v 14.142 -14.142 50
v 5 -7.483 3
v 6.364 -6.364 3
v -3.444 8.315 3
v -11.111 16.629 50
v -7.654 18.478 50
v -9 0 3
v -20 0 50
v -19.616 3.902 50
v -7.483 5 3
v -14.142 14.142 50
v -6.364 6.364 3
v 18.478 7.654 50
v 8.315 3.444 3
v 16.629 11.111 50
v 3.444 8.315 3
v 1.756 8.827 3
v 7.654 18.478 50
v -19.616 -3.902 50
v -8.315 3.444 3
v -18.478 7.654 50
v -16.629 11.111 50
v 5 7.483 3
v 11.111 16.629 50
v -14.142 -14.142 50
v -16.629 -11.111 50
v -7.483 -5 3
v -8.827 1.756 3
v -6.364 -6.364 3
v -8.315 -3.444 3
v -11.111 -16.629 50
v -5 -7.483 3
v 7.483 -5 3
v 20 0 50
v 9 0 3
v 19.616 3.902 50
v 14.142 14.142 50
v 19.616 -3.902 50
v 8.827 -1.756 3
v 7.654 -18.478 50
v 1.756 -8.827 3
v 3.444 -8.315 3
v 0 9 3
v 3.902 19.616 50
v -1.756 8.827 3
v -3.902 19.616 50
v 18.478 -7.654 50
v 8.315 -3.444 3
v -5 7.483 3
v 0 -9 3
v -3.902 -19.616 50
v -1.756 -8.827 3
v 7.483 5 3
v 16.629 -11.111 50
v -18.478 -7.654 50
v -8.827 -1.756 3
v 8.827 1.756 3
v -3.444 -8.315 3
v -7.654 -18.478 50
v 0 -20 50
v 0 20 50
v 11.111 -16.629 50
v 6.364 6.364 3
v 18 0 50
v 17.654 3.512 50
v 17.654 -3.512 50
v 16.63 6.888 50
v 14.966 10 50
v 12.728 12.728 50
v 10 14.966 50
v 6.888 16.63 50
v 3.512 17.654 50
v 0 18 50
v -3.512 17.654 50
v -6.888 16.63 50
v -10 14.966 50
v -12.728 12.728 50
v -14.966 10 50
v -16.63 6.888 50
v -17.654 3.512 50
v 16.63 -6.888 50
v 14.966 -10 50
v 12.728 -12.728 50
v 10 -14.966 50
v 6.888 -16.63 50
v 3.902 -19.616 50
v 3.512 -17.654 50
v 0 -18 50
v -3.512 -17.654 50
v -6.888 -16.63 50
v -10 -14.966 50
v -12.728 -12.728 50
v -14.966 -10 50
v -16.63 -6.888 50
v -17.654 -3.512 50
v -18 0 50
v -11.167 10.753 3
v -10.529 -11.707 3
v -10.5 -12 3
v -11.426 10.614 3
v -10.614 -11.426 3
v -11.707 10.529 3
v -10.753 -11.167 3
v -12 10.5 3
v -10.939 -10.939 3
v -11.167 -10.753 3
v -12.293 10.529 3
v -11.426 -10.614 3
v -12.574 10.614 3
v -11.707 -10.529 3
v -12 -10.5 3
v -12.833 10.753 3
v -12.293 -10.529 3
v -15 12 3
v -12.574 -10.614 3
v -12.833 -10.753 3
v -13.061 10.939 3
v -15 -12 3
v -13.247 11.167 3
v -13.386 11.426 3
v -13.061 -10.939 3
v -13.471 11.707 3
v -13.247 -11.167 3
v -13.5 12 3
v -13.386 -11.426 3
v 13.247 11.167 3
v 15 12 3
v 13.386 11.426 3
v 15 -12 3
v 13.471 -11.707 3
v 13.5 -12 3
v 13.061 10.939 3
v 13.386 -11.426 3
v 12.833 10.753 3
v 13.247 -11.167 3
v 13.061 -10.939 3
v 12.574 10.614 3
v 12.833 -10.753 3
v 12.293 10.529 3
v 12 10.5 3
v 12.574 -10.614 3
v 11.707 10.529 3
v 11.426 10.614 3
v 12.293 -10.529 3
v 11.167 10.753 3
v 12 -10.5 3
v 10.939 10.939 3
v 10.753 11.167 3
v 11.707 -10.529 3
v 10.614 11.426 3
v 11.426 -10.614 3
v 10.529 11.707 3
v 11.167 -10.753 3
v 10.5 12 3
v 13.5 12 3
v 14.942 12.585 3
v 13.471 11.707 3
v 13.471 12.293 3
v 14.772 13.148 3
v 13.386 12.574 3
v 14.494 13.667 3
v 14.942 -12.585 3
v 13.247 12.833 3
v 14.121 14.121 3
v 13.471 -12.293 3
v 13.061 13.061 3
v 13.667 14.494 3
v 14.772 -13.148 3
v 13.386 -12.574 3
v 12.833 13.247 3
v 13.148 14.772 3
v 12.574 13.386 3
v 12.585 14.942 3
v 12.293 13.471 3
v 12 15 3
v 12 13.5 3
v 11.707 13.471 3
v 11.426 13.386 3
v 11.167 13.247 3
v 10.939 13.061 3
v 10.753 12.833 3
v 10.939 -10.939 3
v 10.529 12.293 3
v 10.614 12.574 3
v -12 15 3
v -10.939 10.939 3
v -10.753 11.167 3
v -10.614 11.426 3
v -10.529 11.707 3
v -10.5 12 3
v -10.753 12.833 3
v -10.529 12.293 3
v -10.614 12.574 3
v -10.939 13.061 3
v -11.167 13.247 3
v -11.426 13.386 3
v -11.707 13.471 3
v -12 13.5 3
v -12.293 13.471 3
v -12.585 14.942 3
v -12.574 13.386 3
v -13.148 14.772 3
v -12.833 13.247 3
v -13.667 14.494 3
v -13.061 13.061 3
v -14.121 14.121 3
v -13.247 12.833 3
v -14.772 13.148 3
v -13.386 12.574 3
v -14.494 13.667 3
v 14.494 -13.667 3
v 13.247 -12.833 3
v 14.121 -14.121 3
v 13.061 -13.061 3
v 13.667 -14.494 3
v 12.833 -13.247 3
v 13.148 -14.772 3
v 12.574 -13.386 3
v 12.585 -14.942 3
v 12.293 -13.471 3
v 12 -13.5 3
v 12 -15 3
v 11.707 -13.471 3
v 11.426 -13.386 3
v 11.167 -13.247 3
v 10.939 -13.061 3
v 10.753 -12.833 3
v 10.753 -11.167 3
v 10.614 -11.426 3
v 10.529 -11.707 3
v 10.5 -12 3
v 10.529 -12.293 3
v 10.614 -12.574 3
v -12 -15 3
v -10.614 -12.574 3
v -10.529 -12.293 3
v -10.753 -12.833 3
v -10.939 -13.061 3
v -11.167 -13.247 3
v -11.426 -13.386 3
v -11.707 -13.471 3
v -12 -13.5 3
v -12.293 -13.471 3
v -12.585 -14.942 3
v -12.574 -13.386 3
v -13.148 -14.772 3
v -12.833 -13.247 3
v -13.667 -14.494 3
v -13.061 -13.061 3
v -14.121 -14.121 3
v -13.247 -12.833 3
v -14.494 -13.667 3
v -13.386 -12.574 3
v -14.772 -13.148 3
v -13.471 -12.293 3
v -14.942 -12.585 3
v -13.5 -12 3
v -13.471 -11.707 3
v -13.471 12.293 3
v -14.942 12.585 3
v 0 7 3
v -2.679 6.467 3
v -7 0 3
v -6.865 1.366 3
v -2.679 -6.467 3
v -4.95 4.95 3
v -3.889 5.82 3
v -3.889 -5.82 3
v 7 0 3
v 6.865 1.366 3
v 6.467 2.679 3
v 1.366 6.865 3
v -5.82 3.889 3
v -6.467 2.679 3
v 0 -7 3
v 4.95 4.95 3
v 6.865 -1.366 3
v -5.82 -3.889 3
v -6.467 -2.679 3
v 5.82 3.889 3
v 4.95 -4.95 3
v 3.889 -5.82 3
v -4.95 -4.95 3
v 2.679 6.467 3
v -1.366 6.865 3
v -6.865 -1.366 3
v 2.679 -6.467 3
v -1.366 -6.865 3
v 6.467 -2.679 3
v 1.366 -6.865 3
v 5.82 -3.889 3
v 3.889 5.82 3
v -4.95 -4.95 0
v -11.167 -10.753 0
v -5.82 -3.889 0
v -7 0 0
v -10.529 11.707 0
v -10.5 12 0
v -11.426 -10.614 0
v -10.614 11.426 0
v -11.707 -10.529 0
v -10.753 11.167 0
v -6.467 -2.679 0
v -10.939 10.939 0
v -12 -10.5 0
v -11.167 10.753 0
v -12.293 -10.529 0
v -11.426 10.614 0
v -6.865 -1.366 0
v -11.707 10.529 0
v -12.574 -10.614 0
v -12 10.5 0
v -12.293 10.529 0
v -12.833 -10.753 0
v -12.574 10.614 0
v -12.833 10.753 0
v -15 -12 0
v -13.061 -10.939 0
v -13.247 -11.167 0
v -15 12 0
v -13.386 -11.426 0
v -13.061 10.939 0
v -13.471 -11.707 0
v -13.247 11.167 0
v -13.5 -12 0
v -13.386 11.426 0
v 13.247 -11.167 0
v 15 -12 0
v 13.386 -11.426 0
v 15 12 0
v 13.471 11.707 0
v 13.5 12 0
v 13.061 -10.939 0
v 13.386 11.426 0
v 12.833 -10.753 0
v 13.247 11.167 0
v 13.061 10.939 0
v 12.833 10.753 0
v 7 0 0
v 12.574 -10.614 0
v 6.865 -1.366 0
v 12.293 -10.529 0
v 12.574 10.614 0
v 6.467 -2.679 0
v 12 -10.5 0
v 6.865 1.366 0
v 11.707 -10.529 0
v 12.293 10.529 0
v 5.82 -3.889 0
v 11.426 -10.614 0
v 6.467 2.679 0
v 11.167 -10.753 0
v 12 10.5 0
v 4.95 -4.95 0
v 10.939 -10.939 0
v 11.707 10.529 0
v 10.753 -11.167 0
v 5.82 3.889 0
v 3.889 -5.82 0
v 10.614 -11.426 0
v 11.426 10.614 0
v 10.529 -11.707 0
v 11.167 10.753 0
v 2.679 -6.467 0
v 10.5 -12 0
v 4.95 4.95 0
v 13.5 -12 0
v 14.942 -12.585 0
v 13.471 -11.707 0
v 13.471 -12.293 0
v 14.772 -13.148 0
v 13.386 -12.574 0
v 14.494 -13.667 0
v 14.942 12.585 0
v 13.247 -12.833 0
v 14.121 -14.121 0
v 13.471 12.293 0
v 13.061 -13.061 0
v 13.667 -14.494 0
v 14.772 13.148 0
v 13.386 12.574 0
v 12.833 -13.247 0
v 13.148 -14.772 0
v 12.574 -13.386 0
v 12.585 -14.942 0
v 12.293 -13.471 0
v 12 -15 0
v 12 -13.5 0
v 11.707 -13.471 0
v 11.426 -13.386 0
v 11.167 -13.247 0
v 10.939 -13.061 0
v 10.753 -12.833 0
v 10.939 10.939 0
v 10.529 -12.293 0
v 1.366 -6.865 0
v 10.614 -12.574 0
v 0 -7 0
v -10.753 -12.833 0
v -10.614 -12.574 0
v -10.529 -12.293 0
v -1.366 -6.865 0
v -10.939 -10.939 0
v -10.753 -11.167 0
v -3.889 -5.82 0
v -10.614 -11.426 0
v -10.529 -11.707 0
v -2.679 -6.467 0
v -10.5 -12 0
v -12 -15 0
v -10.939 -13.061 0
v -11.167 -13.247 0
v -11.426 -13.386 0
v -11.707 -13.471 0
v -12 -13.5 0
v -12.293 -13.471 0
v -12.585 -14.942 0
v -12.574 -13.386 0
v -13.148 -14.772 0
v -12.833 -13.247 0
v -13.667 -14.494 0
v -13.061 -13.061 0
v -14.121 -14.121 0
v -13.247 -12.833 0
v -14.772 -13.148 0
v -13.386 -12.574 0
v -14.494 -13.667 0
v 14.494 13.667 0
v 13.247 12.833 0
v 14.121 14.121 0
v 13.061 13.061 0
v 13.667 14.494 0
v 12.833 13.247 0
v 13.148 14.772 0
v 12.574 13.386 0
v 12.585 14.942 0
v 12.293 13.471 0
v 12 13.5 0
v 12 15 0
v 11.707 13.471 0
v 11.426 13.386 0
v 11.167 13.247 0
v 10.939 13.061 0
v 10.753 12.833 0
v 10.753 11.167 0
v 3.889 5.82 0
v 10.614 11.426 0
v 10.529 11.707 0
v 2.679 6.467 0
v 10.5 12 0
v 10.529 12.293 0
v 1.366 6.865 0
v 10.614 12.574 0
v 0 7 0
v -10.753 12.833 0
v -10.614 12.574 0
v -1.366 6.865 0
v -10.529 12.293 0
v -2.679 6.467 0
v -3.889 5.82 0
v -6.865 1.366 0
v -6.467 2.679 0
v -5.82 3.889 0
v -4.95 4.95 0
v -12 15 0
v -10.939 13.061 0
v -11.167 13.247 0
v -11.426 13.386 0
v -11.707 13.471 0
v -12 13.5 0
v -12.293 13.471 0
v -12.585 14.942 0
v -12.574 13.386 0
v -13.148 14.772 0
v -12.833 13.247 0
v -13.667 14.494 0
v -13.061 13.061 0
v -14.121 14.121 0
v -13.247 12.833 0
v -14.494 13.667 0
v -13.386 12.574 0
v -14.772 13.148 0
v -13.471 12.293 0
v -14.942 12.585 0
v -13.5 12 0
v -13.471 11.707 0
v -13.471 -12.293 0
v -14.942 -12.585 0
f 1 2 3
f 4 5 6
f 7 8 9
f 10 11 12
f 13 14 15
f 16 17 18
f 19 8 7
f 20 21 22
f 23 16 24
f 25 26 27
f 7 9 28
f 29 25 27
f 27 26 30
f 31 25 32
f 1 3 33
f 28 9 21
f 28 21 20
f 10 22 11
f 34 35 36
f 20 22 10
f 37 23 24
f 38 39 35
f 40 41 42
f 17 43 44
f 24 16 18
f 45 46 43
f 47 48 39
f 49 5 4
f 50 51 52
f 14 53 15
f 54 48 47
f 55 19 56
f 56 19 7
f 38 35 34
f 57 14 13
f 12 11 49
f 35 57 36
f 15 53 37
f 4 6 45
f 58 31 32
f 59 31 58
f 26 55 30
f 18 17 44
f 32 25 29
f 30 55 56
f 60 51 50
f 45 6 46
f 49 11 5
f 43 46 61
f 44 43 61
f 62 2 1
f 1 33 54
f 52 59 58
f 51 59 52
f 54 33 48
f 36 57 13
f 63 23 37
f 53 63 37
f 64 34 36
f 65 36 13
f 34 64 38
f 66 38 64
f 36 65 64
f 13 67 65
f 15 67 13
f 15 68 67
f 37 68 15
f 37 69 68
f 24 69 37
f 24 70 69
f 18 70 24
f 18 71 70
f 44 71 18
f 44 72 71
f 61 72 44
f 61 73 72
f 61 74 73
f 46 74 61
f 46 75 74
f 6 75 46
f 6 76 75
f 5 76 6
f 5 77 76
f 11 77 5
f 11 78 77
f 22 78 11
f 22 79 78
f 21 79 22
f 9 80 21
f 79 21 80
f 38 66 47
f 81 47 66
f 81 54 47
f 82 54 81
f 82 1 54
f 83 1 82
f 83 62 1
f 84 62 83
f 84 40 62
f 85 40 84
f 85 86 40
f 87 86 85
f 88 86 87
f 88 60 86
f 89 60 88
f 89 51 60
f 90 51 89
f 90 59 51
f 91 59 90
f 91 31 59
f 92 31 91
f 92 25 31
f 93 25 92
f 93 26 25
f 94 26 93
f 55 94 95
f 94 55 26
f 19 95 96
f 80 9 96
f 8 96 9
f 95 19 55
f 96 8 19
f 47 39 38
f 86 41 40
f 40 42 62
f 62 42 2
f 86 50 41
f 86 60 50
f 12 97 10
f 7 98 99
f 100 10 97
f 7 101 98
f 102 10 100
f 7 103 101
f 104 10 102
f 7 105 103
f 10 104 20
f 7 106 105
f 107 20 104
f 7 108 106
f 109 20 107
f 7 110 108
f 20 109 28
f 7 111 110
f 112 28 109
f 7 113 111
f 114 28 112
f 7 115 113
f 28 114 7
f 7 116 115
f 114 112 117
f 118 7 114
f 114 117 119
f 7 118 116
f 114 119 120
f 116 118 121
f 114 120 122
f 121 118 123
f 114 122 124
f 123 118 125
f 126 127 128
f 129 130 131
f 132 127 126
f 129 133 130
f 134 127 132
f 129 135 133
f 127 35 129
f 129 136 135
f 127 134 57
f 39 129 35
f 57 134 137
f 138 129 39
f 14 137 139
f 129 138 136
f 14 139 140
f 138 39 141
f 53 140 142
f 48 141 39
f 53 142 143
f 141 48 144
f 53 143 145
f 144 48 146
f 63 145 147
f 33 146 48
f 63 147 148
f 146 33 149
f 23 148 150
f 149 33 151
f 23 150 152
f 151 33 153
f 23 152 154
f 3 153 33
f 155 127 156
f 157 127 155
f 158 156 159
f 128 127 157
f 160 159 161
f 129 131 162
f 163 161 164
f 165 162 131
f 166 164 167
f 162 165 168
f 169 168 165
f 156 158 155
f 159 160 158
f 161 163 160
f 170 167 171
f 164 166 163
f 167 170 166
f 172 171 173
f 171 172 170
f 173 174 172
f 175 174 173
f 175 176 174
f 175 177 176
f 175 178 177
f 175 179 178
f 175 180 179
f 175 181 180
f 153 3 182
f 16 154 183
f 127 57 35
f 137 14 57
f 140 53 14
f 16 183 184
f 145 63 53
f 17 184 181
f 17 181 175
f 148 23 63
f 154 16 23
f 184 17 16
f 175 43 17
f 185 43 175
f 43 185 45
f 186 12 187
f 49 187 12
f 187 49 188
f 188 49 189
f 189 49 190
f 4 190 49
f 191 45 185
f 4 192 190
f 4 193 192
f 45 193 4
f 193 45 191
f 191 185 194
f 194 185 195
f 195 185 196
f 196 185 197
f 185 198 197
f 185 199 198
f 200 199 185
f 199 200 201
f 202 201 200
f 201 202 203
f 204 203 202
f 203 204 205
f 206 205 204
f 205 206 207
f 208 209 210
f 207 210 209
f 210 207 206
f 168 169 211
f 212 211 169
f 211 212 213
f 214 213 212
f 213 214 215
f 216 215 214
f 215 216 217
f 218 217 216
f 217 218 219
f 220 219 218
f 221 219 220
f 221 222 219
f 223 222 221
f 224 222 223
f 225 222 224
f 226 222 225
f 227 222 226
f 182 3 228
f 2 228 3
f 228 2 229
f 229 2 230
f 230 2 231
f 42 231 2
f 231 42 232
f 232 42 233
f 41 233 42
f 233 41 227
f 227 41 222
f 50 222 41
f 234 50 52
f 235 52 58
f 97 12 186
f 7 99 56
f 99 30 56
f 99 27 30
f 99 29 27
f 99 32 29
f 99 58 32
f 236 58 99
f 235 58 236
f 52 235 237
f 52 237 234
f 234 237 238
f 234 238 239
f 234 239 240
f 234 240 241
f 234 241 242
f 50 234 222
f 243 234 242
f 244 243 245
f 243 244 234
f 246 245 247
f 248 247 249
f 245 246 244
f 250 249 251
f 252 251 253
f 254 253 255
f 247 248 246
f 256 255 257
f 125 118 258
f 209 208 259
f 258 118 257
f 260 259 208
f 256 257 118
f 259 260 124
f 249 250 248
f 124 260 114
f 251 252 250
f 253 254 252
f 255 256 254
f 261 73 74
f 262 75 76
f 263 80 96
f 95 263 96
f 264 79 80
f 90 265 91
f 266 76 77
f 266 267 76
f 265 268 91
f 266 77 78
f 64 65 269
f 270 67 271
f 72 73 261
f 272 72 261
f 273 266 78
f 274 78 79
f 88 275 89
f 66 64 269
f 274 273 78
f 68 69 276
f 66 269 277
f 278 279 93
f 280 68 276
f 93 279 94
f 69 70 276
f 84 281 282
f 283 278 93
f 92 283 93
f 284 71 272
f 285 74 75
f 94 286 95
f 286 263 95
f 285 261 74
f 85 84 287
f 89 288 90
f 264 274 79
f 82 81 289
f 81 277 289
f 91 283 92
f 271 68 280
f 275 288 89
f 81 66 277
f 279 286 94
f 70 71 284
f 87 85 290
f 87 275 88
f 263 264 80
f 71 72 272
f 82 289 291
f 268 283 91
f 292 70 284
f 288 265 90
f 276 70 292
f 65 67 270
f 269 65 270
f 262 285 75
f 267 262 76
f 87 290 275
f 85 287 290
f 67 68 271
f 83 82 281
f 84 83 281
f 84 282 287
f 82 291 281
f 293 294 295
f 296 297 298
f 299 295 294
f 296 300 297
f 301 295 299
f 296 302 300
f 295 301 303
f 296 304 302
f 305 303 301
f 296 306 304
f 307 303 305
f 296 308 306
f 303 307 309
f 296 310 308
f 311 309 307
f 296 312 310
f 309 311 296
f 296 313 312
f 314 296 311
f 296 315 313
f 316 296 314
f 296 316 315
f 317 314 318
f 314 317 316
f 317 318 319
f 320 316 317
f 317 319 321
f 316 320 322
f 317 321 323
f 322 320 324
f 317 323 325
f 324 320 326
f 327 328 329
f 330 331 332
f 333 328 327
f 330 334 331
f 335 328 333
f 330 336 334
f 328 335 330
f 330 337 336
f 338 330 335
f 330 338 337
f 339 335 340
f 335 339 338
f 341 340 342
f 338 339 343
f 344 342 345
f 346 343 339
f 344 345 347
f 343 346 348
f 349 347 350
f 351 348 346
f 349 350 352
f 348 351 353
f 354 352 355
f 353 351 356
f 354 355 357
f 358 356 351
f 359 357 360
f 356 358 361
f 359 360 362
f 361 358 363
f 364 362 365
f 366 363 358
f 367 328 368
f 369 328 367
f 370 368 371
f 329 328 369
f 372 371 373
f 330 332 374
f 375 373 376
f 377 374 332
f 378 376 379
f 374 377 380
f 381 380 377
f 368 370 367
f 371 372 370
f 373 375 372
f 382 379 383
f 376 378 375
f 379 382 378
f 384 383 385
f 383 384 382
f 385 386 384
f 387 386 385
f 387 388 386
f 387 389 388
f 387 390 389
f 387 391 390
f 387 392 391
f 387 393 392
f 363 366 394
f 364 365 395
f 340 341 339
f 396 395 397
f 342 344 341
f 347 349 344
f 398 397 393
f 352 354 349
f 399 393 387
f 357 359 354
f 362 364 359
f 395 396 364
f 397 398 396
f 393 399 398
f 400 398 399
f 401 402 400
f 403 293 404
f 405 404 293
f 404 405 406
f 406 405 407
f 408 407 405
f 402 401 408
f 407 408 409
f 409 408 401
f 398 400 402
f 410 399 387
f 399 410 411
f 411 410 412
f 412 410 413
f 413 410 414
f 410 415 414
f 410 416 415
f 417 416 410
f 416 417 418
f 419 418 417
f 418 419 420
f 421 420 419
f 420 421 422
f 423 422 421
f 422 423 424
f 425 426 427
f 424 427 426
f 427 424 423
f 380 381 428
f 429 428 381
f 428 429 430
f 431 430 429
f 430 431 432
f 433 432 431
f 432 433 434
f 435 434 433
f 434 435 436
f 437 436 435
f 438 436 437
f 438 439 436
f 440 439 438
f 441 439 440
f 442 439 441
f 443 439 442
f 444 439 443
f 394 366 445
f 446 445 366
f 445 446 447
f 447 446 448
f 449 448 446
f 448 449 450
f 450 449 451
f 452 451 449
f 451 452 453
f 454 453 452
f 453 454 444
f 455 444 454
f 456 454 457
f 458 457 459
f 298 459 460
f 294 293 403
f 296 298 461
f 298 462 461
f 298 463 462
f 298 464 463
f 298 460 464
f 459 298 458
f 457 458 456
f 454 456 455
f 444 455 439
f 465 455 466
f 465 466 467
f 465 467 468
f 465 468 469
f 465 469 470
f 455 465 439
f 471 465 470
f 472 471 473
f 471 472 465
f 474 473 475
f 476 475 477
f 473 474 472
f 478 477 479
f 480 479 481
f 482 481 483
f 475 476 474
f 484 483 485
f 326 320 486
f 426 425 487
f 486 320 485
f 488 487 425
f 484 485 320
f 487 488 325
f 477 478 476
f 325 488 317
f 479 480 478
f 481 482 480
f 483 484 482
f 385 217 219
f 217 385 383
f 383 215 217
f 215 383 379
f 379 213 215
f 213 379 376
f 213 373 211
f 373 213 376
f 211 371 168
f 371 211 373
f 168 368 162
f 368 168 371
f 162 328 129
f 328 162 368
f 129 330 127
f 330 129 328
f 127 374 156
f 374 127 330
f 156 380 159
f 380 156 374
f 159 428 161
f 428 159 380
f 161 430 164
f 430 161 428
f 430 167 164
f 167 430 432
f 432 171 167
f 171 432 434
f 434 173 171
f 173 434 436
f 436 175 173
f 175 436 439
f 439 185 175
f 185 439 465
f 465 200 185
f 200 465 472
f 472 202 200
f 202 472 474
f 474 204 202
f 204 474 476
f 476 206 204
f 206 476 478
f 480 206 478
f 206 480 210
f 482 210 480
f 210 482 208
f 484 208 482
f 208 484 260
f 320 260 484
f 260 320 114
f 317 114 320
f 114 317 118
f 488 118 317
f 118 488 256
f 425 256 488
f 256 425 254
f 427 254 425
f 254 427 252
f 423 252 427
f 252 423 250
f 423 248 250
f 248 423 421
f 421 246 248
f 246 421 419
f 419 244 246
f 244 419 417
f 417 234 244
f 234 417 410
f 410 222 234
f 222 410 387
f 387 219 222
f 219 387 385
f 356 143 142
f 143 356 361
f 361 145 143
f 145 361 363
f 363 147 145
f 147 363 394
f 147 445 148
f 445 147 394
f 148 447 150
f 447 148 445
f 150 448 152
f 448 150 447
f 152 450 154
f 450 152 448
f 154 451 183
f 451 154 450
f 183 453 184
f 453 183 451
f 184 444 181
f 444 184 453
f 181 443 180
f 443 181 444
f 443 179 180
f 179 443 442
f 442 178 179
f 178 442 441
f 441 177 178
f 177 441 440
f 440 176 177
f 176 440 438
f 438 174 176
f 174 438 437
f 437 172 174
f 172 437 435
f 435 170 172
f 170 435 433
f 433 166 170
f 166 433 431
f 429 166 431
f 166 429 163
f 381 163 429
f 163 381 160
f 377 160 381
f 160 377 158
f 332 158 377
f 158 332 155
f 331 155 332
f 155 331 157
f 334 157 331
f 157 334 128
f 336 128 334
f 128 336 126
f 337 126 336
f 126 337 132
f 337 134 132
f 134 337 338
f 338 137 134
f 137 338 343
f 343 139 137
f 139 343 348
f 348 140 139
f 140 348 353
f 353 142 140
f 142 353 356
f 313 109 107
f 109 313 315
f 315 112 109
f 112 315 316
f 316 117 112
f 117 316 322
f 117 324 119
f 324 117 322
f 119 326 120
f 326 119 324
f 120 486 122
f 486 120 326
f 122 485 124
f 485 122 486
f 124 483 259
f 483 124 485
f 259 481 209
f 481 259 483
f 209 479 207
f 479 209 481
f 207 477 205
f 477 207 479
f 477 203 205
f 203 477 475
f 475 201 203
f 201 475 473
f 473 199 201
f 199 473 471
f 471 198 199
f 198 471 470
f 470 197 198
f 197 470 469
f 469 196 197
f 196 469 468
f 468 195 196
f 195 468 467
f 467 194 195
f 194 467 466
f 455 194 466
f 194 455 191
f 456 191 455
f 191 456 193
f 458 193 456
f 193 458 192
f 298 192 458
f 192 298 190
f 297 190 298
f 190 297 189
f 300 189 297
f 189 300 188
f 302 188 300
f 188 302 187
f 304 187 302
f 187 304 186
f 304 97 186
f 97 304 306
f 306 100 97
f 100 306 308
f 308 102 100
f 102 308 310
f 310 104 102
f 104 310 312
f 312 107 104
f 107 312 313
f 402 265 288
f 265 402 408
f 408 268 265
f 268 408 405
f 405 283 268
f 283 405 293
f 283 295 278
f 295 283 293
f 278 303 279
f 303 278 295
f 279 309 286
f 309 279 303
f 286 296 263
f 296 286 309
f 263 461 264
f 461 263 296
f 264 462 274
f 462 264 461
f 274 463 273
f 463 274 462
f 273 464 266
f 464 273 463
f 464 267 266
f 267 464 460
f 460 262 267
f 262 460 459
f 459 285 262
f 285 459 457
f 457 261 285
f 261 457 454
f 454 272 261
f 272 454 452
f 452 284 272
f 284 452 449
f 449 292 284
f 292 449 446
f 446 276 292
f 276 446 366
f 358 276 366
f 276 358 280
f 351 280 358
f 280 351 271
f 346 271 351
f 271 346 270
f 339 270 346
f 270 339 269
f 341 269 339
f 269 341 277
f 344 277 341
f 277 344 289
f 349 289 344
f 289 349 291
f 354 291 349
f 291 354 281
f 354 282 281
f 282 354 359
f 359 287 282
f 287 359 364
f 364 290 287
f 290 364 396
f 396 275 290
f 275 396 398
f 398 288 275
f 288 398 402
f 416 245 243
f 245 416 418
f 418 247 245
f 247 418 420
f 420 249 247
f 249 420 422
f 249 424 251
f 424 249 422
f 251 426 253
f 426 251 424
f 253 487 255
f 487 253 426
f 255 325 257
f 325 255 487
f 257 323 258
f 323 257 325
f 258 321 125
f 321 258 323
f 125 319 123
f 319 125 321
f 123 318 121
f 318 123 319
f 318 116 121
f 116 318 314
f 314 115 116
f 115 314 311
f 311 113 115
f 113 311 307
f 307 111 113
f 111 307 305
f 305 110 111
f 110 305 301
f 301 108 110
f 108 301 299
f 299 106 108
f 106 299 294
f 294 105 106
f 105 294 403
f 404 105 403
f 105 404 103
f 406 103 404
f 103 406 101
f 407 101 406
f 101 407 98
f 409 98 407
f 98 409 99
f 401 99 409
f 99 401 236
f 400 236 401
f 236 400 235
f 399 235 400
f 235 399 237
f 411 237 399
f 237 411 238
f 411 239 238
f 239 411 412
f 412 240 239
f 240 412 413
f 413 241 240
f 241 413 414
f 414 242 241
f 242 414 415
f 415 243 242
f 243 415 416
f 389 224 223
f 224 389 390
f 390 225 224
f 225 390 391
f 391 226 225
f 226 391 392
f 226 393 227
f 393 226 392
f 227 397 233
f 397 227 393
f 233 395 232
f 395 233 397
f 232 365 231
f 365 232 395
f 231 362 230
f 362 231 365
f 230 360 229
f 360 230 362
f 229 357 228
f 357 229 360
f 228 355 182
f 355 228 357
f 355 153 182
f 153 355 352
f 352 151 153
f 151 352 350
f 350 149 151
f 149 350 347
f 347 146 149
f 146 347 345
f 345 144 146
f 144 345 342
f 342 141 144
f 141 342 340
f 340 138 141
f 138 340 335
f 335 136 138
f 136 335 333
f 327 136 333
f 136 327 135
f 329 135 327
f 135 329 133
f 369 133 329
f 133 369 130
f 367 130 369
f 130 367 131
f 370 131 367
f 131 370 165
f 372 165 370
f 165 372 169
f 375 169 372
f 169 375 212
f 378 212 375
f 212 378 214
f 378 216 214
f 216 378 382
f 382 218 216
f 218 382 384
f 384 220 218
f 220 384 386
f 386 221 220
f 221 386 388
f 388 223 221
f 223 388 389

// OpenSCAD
$fn=32;

dplate=30;                  // diameter of nozzle mount plate
dscr=3;                  // diameter of screw holes in fan
rc=3;                       // corner radius
wt=2;                       // wall thickness
dhole=14;

nozzle_mount(dhole=dhole);

difference() {
    rotate_extrude(angle=360) {
        polygon([[0,1.5*wt],[dhole/2+wt,1.5*wt],[20,50],[0,50]]);
    }
    rotate_extrude(angle=360) {
        polygon([[0,1.5*wt],[dhole/2,1.5*wt],[20-wt,50],[0,50]]);
    }
}

// ===================================================================================

module nozzle_mount(dhole) {
    linear_extrude(1.5*wt) difference() {
        // mounting plate for fan
        hull() {
            translate([dplate/2-rc,dplate/2-rc,0]) circle(rc);
            translate([-dplate/2+rc,dplate/2-rc,0]) circle(rc);
            translate([-dplate/2+rc,-dplate/2+rc,0]) circle(rc);
            translate([dplate/2-rc,-dplate/2+rc,0]) circle(rc);
        }
        // screw holes
        translate([dplate/2-rc,dplate/2-rc,0]) circle(dscr/2);
        translate([-dplate/2+rc,dplate/2-rc,0]) circle(dscr/2);
        translate([-dplate/2+rc,-dplate/2+rc,0]) circle(dscr/2);
        translate([dplate/2-rc,-dplate/2+rc,0]) circle(dscr/2);
        // hole
        circle(d=dhole);
    }
}
